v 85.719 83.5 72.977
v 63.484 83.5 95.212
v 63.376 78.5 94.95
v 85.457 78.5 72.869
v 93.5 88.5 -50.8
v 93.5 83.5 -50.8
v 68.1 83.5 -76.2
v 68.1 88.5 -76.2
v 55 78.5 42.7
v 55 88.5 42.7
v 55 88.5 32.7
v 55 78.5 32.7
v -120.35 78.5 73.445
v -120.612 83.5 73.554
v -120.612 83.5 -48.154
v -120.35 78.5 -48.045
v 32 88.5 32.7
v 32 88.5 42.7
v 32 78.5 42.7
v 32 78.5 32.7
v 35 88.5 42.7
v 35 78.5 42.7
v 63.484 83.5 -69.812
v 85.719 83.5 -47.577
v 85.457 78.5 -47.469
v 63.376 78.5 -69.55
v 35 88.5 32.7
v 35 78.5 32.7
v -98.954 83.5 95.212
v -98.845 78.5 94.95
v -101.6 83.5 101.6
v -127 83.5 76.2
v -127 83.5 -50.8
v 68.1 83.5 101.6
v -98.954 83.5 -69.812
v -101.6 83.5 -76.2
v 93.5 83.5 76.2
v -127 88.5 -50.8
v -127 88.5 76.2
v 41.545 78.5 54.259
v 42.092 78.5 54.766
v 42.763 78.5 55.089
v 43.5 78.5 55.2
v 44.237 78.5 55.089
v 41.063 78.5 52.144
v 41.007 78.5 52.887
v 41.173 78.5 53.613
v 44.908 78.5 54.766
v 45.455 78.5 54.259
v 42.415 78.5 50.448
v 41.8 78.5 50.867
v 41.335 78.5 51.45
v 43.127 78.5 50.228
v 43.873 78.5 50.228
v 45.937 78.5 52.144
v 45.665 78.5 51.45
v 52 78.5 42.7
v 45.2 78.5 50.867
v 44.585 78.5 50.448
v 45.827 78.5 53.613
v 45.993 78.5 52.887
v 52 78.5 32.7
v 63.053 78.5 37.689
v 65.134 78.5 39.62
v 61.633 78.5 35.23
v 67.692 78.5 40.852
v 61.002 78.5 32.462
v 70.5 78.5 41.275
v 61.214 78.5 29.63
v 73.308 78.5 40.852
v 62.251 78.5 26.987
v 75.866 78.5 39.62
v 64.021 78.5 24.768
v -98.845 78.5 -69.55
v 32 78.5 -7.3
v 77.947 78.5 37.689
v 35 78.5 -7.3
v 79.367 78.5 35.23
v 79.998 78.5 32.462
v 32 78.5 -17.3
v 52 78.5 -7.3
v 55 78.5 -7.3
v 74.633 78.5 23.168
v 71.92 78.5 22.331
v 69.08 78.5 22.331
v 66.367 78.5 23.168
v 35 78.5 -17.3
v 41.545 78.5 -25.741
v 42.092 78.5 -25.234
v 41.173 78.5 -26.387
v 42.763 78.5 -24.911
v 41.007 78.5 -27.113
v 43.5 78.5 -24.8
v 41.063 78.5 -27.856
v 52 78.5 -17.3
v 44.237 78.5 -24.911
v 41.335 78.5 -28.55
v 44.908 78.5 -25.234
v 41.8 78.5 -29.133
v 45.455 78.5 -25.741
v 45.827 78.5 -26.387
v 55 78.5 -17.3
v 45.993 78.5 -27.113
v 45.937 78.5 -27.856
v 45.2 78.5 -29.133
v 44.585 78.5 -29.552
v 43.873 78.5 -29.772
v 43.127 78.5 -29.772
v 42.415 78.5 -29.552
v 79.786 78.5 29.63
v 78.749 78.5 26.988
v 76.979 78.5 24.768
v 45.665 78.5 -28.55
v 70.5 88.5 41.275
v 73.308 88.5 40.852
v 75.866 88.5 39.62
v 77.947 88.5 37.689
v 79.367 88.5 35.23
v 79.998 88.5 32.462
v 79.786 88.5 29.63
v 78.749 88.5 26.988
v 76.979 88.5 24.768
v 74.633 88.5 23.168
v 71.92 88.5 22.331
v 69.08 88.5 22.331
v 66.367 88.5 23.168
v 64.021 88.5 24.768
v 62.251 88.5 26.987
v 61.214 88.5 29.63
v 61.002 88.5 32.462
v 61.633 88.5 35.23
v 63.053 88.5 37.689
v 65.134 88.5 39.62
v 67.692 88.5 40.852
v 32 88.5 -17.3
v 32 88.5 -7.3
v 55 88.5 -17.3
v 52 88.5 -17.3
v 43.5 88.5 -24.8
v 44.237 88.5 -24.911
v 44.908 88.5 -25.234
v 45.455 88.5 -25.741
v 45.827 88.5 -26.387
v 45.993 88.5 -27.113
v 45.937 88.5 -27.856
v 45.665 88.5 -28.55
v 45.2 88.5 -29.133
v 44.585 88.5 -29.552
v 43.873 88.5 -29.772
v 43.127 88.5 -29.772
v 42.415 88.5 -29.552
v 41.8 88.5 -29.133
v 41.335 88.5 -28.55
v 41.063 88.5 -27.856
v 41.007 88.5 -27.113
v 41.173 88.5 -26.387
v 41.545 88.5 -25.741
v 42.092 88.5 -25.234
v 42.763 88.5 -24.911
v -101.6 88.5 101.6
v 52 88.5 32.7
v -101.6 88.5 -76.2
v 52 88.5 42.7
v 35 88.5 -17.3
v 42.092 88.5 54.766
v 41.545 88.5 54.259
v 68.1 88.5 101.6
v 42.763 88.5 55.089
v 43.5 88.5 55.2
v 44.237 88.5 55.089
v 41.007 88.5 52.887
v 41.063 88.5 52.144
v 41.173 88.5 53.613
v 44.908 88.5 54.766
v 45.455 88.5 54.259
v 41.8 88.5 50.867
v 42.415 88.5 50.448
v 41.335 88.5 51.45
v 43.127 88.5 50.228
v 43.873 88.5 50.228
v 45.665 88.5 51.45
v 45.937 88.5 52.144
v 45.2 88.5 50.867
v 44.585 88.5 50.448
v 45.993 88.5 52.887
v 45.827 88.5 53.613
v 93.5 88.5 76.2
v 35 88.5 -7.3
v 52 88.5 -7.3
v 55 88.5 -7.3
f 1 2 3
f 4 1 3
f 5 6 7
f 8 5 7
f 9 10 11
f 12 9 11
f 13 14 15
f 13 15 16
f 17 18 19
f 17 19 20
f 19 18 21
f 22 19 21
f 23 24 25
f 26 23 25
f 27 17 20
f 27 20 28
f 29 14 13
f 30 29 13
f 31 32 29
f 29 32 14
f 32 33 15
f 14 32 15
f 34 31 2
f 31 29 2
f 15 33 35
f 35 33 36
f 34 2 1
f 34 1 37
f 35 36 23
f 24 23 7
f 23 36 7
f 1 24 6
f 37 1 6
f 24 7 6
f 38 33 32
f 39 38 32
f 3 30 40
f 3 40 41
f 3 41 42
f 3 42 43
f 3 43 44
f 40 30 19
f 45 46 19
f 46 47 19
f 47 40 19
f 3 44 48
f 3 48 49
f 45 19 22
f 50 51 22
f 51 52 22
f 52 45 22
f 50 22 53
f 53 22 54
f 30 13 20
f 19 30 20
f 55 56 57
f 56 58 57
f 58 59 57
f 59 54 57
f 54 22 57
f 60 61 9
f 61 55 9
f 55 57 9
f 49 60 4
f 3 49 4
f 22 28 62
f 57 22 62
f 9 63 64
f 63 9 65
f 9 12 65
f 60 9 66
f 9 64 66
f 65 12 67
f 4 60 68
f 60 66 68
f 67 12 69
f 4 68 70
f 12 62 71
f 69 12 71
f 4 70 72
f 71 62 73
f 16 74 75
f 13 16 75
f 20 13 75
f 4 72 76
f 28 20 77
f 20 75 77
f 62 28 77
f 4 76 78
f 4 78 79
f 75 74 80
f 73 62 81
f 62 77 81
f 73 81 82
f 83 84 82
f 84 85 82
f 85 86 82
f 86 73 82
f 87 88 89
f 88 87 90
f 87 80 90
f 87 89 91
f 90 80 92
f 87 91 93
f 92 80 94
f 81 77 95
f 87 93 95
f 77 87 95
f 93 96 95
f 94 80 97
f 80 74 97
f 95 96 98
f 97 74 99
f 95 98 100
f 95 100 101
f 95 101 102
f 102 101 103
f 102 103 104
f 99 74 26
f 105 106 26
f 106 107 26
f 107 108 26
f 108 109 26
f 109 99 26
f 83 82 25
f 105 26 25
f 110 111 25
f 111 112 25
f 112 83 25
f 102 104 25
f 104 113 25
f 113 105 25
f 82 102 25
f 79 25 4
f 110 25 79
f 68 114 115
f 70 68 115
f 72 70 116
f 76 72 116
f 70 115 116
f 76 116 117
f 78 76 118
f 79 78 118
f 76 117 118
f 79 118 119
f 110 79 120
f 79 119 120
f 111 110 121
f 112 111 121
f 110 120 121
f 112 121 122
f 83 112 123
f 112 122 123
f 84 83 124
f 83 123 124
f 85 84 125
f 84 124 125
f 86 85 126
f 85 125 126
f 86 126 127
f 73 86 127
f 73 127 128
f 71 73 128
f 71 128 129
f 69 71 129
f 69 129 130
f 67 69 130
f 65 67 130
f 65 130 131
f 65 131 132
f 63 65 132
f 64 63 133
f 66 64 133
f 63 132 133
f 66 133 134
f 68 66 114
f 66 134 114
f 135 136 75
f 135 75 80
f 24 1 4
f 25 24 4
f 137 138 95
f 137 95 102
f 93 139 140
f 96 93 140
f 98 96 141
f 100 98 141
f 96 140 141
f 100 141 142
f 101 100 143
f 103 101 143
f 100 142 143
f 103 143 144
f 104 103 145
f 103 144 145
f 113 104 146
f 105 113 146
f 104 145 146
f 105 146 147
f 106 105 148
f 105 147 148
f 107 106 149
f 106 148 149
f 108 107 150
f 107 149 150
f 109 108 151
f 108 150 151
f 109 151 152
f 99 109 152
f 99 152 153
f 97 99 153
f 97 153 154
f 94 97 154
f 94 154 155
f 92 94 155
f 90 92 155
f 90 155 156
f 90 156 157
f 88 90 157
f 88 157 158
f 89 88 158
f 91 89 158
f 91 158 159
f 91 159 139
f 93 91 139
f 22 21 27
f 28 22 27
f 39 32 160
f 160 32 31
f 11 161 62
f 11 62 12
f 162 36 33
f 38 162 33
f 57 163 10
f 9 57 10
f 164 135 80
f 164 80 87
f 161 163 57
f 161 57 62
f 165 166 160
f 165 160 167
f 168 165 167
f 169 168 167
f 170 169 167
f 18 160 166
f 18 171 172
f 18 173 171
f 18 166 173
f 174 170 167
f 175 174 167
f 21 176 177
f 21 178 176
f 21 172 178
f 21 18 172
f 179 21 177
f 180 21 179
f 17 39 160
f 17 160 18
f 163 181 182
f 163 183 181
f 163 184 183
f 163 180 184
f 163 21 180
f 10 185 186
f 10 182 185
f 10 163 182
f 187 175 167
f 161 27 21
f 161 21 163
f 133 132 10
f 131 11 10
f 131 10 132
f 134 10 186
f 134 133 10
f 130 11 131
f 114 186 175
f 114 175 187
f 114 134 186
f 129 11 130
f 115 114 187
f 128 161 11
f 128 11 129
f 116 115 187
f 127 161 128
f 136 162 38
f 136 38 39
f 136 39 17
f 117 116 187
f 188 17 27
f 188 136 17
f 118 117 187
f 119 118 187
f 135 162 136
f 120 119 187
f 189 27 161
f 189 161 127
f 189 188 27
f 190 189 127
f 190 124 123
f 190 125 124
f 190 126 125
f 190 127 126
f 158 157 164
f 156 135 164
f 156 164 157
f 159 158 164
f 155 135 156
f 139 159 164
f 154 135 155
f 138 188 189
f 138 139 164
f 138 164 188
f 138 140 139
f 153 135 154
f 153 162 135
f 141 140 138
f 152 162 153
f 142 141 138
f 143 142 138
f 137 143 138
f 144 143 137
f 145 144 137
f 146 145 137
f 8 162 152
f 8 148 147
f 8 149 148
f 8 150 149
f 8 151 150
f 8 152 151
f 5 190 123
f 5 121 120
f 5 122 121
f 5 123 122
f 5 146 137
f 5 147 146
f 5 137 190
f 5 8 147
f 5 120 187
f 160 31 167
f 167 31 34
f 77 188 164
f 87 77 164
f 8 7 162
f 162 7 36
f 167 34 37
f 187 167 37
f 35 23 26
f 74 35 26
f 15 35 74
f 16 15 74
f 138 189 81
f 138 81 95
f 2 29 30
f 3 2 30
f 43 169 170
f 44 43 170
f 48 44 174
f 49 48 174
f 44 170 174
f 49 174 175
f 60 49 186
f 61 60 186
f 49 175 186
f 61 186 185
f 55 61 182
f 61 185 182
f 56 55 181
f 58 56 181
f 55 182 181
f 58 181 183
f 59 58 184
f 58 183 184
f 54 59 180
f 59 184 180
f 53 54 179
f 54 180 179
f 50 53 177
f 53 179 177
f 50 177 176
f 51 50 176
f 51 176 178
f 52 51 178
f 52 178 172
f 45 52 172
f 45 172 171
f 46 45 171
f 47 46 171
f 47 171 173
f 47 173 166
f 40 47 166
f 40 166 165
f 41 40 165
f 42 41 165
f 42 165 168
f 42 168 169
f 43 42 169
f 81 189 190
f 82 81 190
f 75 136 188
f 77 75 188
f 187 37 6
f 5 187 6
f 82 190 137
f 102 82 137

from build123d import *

# Parameters (mm, degrees)
SKETCH2_W               = 190.5
SKETCH2_H               = 177.8
BOSS_EXTRUDE1_DEPTH     = 5.08
CHAMFER1_SIZE           = 25.4
BOSS_EXTRUDE3_DEPTH     = 68.42
SKETCH5_R               = 9
SKETCH5_R_2             = 1.5
CUT_EXTRUDE1_DEPTH      = 231.530019737
SKETCH10_W              = 177.8
SKETCH10_H              = 73.5
BOSS_EXTRUDE6_DEPTH     = 30
CHAMFER3_SIZE           = 25.4
CUT_EXTRUDE2_DEPTH      = 68.42
BOSS_EXTRUDE7_START     = 38.1
BOSS_EXTRUDE7_DEPTH     = 10
SKETCH13_W              = 15.24
SKETCH13_H              = 10
BOSS_EXTRUDE8_DEPTH     = 7
SKETCH14_R              = 2.5
CUT_EXTRUDE3_DEPTH      = 10
MIRROR4_COPY_1_SKETCH_W = 15.24
MIRROR4_COPY_1_SKETCH_H = 10
MIRROR4_COPY_1_DEPTH    = 7
MIRROR4_COPY_2_SKETCH_R = 2.5
MIRROR4_COPY_2_DEPTH    = 10
BOSS_EXTRUDE9_START     = 5
BOSS_EXTRUDE9_DEPTH     = 5
BOSS_EXTRUDE10_START    = 10
BOSS_EXTRUDE10_DEPTH    = 5
SKETCH16_R              = 2.5
CUT_EXTRUDE4_DEPTH      = 163.946494286
SKETCH17_W              = 3
SKETCH17_H              = 10
CUT_EXTRUDE5_DEPTH      = 163.946494286
BOSS_EXTRUDE11_START    = 10
SKETCH18_W              = 3
SKETCH18_H              = 10
BOSS_EXTRUDE11_DEPTH    = 10
BOSS_EXTRUDE11_2_DEPTH  = 10
BOSS_EXTRUDE11_3_DEPTH  = 10
BOSS_EXTRUDE11_4_DEPTH  = 10
SKETCH19_W              = 23
SKETCH19_H              = 60
BOSS_EXTRUDE12_DEPTH    = 20
CHAMFER5_SIZE           = 5.724341006
CHAMFER5_SIZE_2         = 0.3
BOSS_EXTRUDE13_START    = -20
SKETCH20_R              = 2.5
BOSS_EXTRUDE13_DEPTH    = 4
SKETCH21_R              = 9.525
CUT_EXTRUDE6_DEPTH      = 10


with BuildPart() as part:
    # Sketch2 → Boss-Extrude1 (new body)
    with BuildSketch(Plane(origin=(0, 0, 0), x_dir=(1, 0, 0), z_dir=(0, 1, 0))):
        with Locations((-31.75, -12.7)):
            Rectangle(SKETCH2_W, SKETCH2_H)
    extrude(amount=BOSS_EXTRUDE1_DEPTH)

    # Chamfer1
    chamfer1_edges = [part.edges().sort_by_distance(p)[0] for p in [
        (-127, 2.54, -76.2),
        (-127, 2.54, 101.6),
    ]]
    chamfer(chamfer1_edges, length=CHAMFER1_SIZE)

    # Sketch4 → Boss-Extrude3 (add)
    with BuildSketch(Plane(origin=(0, 5.08, 0), x_dir=(1, 0, 0), z_dir=(0, 1, 0))):
        Polygon((57.15, 69.85), (-98.969743879, 69.85), (-120.65, 48.169743879), (-120.65, -73.569743879), (-98.969743879, -95.25), (57.15, -95.25), (63.5, -95.25), (63.5, -101.6), (-101.6, -101.6), (-127, -76.2), (-127, 50.8), (-101.6, 76.2), (63.5, 76.2), (63.5, 69.85), align=None)
    extrude(amount=BOSS_EXTRUDE3_DEPTH)

    # Sketch5 → Cut-Extrude1 (cut, through all)
    with BuildSketch(Plane.XY.offset(101.6)):
        with Locations((-50.8, 31.75)):
            Circle(SKETCH5_R)
        with Locations((-50.8, 47.25)):
            Circle(SKETCH5_R_2)
        with Locations((-37.376606241, 39.5)):
            Circle(SKETCH5_R_2)
        with Locations((-37.376606241, 24)):
            Circle(SKETCH5_R_2)
        with Locations((-50.8, 16.25)):
            Circle(SKETCH5_R_2)
        with Locations((-64.223393759, 24)):
            Circle(SKETCH5_R_2)
        with Locations((-64.223393759, 39.5)):
            Circle(SKETCH5_R_2)
    extrude(amount=-CUT_EXTRUDE1_DEPTH, mode=Mode.SUBTRACT)

    # Sketch10 → Boss-Extrude6 (add)
    with BuildSketch(Plane(origin=(63.5, 0, 0), x_dir=(0, 0, -1), z_dir=(1, 0, 0))):
        with Locations((-12.7, 36.75)):
            Rectangle(SKETCH10_W, SKETCH10_H)
    extrude(amount=BOSS_EXTRUDE6_DEPTH)

    # Chamfer3
    chamfer3_edges = [part.edges().sort_by_distance(p)[0] for p in [
        (93.5, 36.75, 101.6),
        (93.5, 36.75, -76.2),
    ]]
    chamfer(chamfer3_edges, length=CHAMFER3_SIZE)

    # Sketch11 → Cut-Extrude2 (cut)
    with BuildSketch(Plane(origin=(0, 73.5, 0), x_dir=(1, 0, 0), z_dir=(0, 1, 0))):
        Polygon((85.757180746, -72.992819254), (85.757180746, 47.592819254), (63.5, 69.85), (63.5, -95.25), align=None)
    extrude(amount=-CUT_EXTRUDE2_DEPTH, mode=Mode.SUBTRACT)

    # Sketch12 → Boss-Extrude7 (add)
    with BuildSketch(Plane(origin=(0, 0, 95.25), x_dir=(-1, 0, 0), z_dir=(0, 0, -1)).offset(BOSS_EXTRUDE7_START)):
        with BuildLine():
            Line((25.8, 5.08), (75.8, 5.08))
            Line((75.8, 5.08), (75.8, 31.75))
            Line((75.8, 31.75), (69.8, 31.75))
            ThreePointArc((69.8, 31.75), (50.8, 12.75), (31.8, 31.75))
            Line((31.8, 31.75), (25.8, 31.75))
            Line((25.8, 31.75), (25.8, 5.08))
        make_face()
    boss_extrude7 = extrude(amount=BOSS_EXTRUDE7_DEPTH)

    # Sketch13 → Boss-Extrude8 (add)
    with BuildSketch(Plane(origin=(0, 31.75, 0), x_dir=(1, 0, 0), z_dir=(0, 1, 0))):
        with Locations((-24.18, -52.15)):
            Rectangle(SKETCH13_W, SKETCH13_H)
    boss_extrude8 = extrude(amount=-BOSS_EXTRUDE8_DEPTH)

    # Sketch14 → Cut-Extrude3 (cut)
    with BuildSketch(Plane(origin=(0, 31.75, 0), x_dir=(1, 0, 0), z_dir=(0, 1, 0))):
        with Locations(Location((-20.37, -52.15, 0), (0, 0, 270))):
            Circle(SKETCH14_R)
    cut_extrude3 = extrude(amount=-CUT_EXTRUDE3_DEPTH, mode=Mode.SUBTRACT)

    # Mirror2: Boss-Extrude8 across plane
    add(boss_extrude8.mirror(Plane.ZY.offset(50.8)))

    # Mirror3: Cut-Extrude3 across plane
    add(cut_extrude3.mirror(Plane.ZY.offset(50.8)), mode=Mode.SUBTRACT)

    # Mirror4: Boss-Extrude7, Boss-Extrude8, Cut-Extrude3 across plane
    add(boss_extrude7.mirror(Plane.XY.offset(12.7)))
    add(boss_extrude8.mirror(Plane.XY.offset(12.7)))
    add(cut_extrude3.mirror(Plane.XY.offset(12.7)), mode=Mode.SUBTRACT)

    # Mirror4 copy 1 sketch → Mirror4 copy 1 (add)
    with BuildSketch(Plane(origin=(-101.6, 31.75, 25.4), x_dir=(-1, 0, 0), z_dir=(0, 1, 0))):
        with Locations((-24.18, -52.15)):
            Rectangle(MIRROR4_COPY_1_SKETCH_W, MIRROR4_COPY_1_SKETCH_H)
    extrude(amount=-MIRROR4_COPY_1_DEPTH)

    # Mirror4 copy 2 sketch → Mirror4 copy 2 (cut)
    with BuildSketch(Plane(origin=(-101.6, 31.75, 25.4), x_dir=(-1, 0, 0), z_dir=(0, 1, 0))):
        with Locations(Location((-20.37, -52.15, 0), (0, 0, 270))):
            Circle(MIRROR4_COPY_2_SKETCH_R)
    extrude(amount=-MIRROR4_COPY_2_DEPTH, mode=Mode.SUBTRACT)


with BuildPart() as body_2:
    # Sketch15 → Boss-Extrude9 (new body)
    with BuildSketch(Plane(origin=(0, 73.5, 0), x_dir=(1, 0, 0), z_dir=(0, 1, 0)).offset(BOSS_EXTRUDE9_START)):
        Polygon((85.757180746, 47.592819254), (63.5, 69.85), (-98.969743879, 69.85), (-120.65, 48.169743879), (-120.65, -73.569743879), (-98.969743879, -95.25), (63.5, -95.25), (85.757180746, -72.992819254), align=None)
    extrude(amount=BOSS_EXTRUDE9_DEPTH)

    # Sketch15<3> → Boss-Extrude10 (add)
    with BuildSketch(Plane(origin=(0, 73.5, 0), x_dir=(1, 0, 0), z_dir=(0, 1, 0)).offset(BOSS_EXTRUDE10_START)):
        Polygon((68.1, -101.6), (93.5, -76.2), (93.5, 50.8), (68.1, 76.2), (-101.6, 76.2), (-127, 50.8), (-127, -76.2), (-101.6, -101.6), align=None)
    extrude(amount=BOSS_EXTRUDE10_DEPTH)

    # Sketch16 → Cut-Extrude4 (cut, through all)
    with BuildSketch(Plane(origin=(0, 88.5, 0), x_dir=(1, 0, 0), z_dir=(0, 1, 0))):
        with Locations(Location((43.5, 27.3, 0), (0, 0, 270))):
            Circle(SKETCH16_R)
        with Locations(Location((43.5, -52.7, 0), (0, 0, 270))):
            Circle(SKETCH16_R)
    extrude(amount=-CUT_EXTRUDE4_DEPTH, mode=Mode.SUBTRACT)

    # Sketch17 → Cut-Extrude5 (cut, through all)
    with BuildSketch(Plane(origin=(0, 88.5, 0), x_dir=(1, 0, 0), z_dir=(0, 1, 0))):
        with Locations((33.5, 12.3)):
            Rectangle(SKETCH17_W, SKETCH17_H)
        with Locations((53.5, 12.3)):
            Rectangle(SKETCH17_W, SKETCH17_H)
        with Locations((33.5, -37.7)):
            Rectangle(SKETCH17_W, SKETCH17_H)
        with Locations((53.5, -37.7)):
            Rectangle(SKETCH17_W, SKETCH17_H)
    extrude(amount=-CUT_EXTRUDE5_DEPTH, mode=Mode.SUBTRACT)

    # Chamfer5
    # the kernel refuses this chamfer: 5.724341006, 0.3 mm, written as the material it takes off along each edge
    with BuildSketch(Plane(origin=(52.976460511, 78.5, 105.773539489), x_dir=(0.0014234225126538123, 0.999997973866298, 0.0014234225126538165), z_dir=(0.7071067811865485, 0, -0.7071067811865466))) as chamfer5_piece_1_section:
        Polygon((CHAMFER5_SIZE * 0.999997973922, -CHAMFER5_SIZE * 0.00201302342249), (-CHAMFER5_SIZE_2 * 0.00201302342238, -CHAMFER5_SIZE_2 * 0.999997973866), (0, 0), align=None)
    chamfer5_piece_1 = extrude(amount=61.24147141, mode=Mode.PRIVATE)
    chamfer5_piece_1 = split(chamfer5_piece_1, bisect_by=Plane(origin=(74.599777389, 83.5, 84.092596643), z_dir=(0, -1, 0)), keep=Keep.TOP, mode=Mode.PRIVATE)
    add(chamfer5_piece_1, mode=Mode.SUBTRACT)
    with BuildSketch(Plane(origin=(-113.852276148, 78.5, 95.25), x_dir=(0, 0.999997973866298, 0.002013023422382438), z_dir=(1, 0, 0))) as chamfer5_piece_2_section:
        Polygon((CHAMFER5_SIZE * 0.999997973922, -CHAMFER5_SIZE * 0.00201302342249), (-CHAMFER5_SIZE_2 * 0.00201302342238, -CHAMFER5_SIZE_2 * 0.999997973866), (0, 0), align=None)
    chamfer5_piece_2 = extrude(amount=192.234808418, mode=Mode.PRIVATE)
    chamfer5_piece_2 = split(chamfer5_piece_2, bisect_by=Plane(origin=(-17.734871939, 83.5, 95.209252287), z_dir=(0, -1, 0)), keep=Keep.TOP, mode=Mode.PRIVATE)
    add(chamfer5_piece_2, mode=Mode.SUBTRACT)
    with BuildSketch(Plane(origin=(-131.173539489, 78.5, 63.04620439), x_dir=(-0.0014234225126544158, 0.999997973866298, 0.0014234225126544065), z_dir=(0.7071067811865452, 0, 0.7071067811865498))) as chamfer5_piece_3_section:
        Polygon((CHAMFER5_SIZE * 0.999997973922, -CHAMFER5_SIZE * 0.00201302342249), (-CHAMFER5_SIZE_2 * 0.00201302342238, -CHAMFER5_SIZE_2 * 0.999997973866), (0, 0), align=None)
    chamfer5_piece_3 = extrude(amount=60.425576781, mode=Mode.PRIVATE)
    chamfer5_piece_3 = split(chamfer5_piece_3, bisect_by=Plane(origin=(-109.781058955, 83.5, 84.381058955), z_dir=(0, -1, 0)), keep=Keep.TOP, mode=Mode.PRIVATE)
    add(chamfer5_piece_3, mode=Mode.SUBTRACT)
    with BuildSketch(Plane(origin=(-120.65, 78.5, -63.052276148), x_dir=(-0.002013023422382438, 0.999997973866298, 0), z_dir=(0, 0, 1))) as chamfer5_piece_4_section:
        Polygon((CHAMFER5_SIZE * 0.999997973922, -CHAMFER5_SIZE * 0.00201302342249), (-CHAMFER5_SIZE_2 * 0.00201302342238, -CHAMFER5_SIZE_2 * 0.999997973866), (0, 0), align=None)
    chamfer5_piece_4 = extrude(amount=151.504552297, mode=Mode.PRIVATE)
    chamfer5_piece_4 = split(chamfer5_piece_4, bisect_by=Plane(origin=(-120.609252287, 83.5, 12.7), z_dir=(0, -1, 0)), keep=Keep.TOP, mode=Mode.PRIVATE)
    add(chamfer5_piece_4, mode=Mode.SUBTRACT)
    with BuildSketch(Plane(origin=(-88.44620439, 78.5, -80.373539489), x_dir=(-0.001423422512653215, 0.999997973866298, -0.0014234225126532204), z_dir=(-0.7071067811865488, 0, 0.7071067811865462))) as chamfer5_piece_5_section:
        Polygon((CHAMFER5_SIZE * 0.999997973922, -CHAMFER5_SIZE * 0.0020130234225), (-CHAMFER5_SIZE_2 * 0.00201302342238, -CHAMFER5_SIZE_2 * 0.999997973866), (0, 0), align=None)
    chamfer5_piece_5 = extrude(amount=60.425576781, mode=Mode.PRIVATE)
    chamfer5_piece_5 = split(chamfer5_piece_5, bisect_by=Plane(origin=(-109.781058955, 83.5, -58.981058955), z_dir=(0, -1, 0)), keep=Keep.TOP, mode=Mode.PRIVATE)
    add(chamfer5_piece_5, mode=Mode.SUBTRACT)
    with BuildSketch(Plane(origin=(78.382532269, 78.5, -69.85), x_dir=(0, 0.999997973866298, -0.002013023422382438), z_dir=(-1, 0, 0))) as chamfer5_piece_6_section:
        Polygon((CHAMFER5_SIZE * 0.999997973922, -CHAMFER5_SIZE * 0.00201302342249), (-CHAMFER5_SIZE_2 * 0.00201302342238, -CHAMFER5_SIZE_2 * 0.999997973866), (0, 0), align=None)
    chamfer5_piece_6 = extrude(amount=192.234808418, mode=Mode.PRIVATE)
    chamfer5_piece_6 = split(chamfer5_piece_6, bisect_by=Plane(origin=(-17.734871939, 83.5, -69.809252287), z_dir=(0, -1, 0)), keep=Keep.TOP, mode=Mode.PRIVATE)
    add(chamfer5_piece_6, mode=Mode.SUBTRACT)
    with BuildSketch(Plane(origin=(96.280720235, 78.5, -37.069279765), x_dir=(0.0014234225126538128, 0.999997973866298, -0.0014234225126538162), z_dir=(-0.7071067811865483, 0, -0.7071067811865467))) as chamfer5_piece_7_section:
        Polygon((CHAMFER5_SIZE * 0.999997973922, -CHAMFER5_SIZE * 0.00201302342249), (-CHAMFER5_SIZE_2 * 0.00201302342238, -CHAMFER5_SIZE_2 * 0.999997973866), (0, 0), align=None)
    chamfer5_piece_7 = extrude(amount=61.24147141, mode=Mode.PRIVATE)
    chamfer5_piece_7 = split(chamfer5_piece_7, bisect_by=Plane(origin=(74.599777389, 83.5, -58.692596643), z_dir=(0, -1, 0)), keep=Keep.TOP, mode=Mode.PRIVATE)
    add(chamfer5_piece_7, mode=Mode.SUBTRACT)
    with BuildSketch(Plane(origin=(85.757180746, 78.5, 87.875351523), x_dir=(0.002013023422382438, 0.999997973866298, 0), z_dir=(0, 0, -1))) as chamfer5_piece_8_section:
        Polygon((CHAMFER5_SIZE * 0.999997973922, -CHAMFER5_SIZE * 0.00201302342249), (-CHAMFER5_SIZE_2 * 0.00201302342238, -CHAMFER5_SIZE_2 * 0.999997973866), (0, 0), align=None)
    chamfer5_piece_8 = extrude(amount=150.350703047, mode=Mode.PRIVATE)
    chamfer5_piece_8 = split(chamfer5_piece_8, bisect_by=Plane(origin=(85.716433033, 83.5, 12.7), z_dir=(0, -1, 0)), keep=Keep.TOP, mode=Mode.PRIVATE)
    add(chamfer5_piece_8, mode=Mode.SUBTRACT)

    # Sketch21 → Cut-Extrude6 (cut)
    with BuildSketch(Plane(origin=(0, 88.5, 0), x_dir=(1, 0, 0), z_dir=(0, 1, 0))):
        with Locations(Location((70.5, -31.75, 0), (0, 0, 270))):
            Circle(SKETCH21_R)
    extrude(amount=-CUT_EXTRUDE6_DEPTH, mode=Mode.SUBTRACT)


with BuildPart() as body_2_2:
    # Sketch18 → Boss-Extrude11 (new body)
    with BuildSketch(Plane(origin=(0, 88.5, 0), x_dir=(1, 0, 0), z_dir=(0, 1, 0)).offset(BOSS_EXTRUDE11_START)):
        with Locations((53.5, -37.7)):
            Rectangle(SKETCH18_W, SKETCH18_H)
    extrude(amount=BOSS_EXTRUDE11_DEPTH)



with BuildPart() as body_3:
    # Sketch18 → Boss-Extrude11 2 (new body)
    with BuildSketch(Plane(origin=(0, 88.5, 0), x_dir=(1, 0, 0), z_dir=(0, 1, 0)).offset(BOSS_EXTRUDE11_START)):
        with Locations((33.5, -37.7)):
            Rectangle(SKETCH18_W, SKETCH18_H)
    extrude(amount=BOSS_EXTRUDE11_2_DEPTH)


with BuildPart() as body_4:
    # Sketch18 → Boss-Extrude11 3 (new body)
    with BuildSketch(Plane(origin=(0, 88.5, 0), x_dir=(1, 0, 0), z_dir=(0, 1, 0)).offset(BOSS_EXTRUDE11_START)):
        with Locations((33.5, 12.3)):
            Rectangle(SKETCH18_W, SKETCH18_H)
    extrude(amount=BOSS_EXTRUDE11_3_DEPTH)


with BuildPart() as body_5:
    # Sketch18 → Boss-Extrude11 4 (new body)
    with BuildSketch(Plane(origin=(0, 88.5, 0), x_dir=(1, 0, 0), z_dir=(0, 1, 0)).offset(BOSS_EXTRUDE11_START)):
        with Locations((53.5, 12.3)):
            Rectangle(SKETCH18_W, SKETCH18_H)
    extrude(amount=BOSS_EXTRUDE11_4_DEPTH)


with BuildPart() as body_2_2_1:
    add(body_2_2.part)

    add(body_3.part)  # Boss-Extrude12 merges body 3

    add(body_4.part)  # Boss-Extrude12 merges body 4

    add(body_5.part)  # Boss-Extrude12 merges body 5
    # Sketch19 → Boss-Extrude12 (add)
    with BuildSketch(Plane(origin=(0, 108.5, 0), x_dir=(1, 0, 0), z_dir=(0, 1, 0))):
        with Locations((43.5, -12.7)):
            Rectangle(SKETCH19_W, SKETCH19_H)
    extrude(amount=BOSS_EXTRUDE12_DEPTH)

    # Sketch20 → Boss-Extrude13 (add)
    # profile 1 of 2: a face of its own
    with BuildSketch(Plane(origin=(0, 128.5, 0), x_dir=(1, 0, 0), z_dir=(0, 1, 0)).offset(BOSS_EXTRUDE13_START)):
        with BuildLine():
            Line((32, 17.3), (39.162824532, 29.787751788))
            ThreePointArc((39.162824532, 29.787751788), (43.5, 32.3), (47.837175468, 29.787751788))
            Line((47.837175468, 29.787751788), (55, 17.3))
            Line((55, 17.3), (32, 17.3))
        make_face()
        with Locations(Location((43.5, 27.3, 0), (0, 0, 270))):
            Circle(SKETCH20_R, mode=Mode.SUBTRACT)
    # profile 2 of 2: a face of its own
    with BuildSketch(Plane(origin=(0, 128.5, 0), x_dir=(1, 0, 0), z_dir=(0, 1, 0)).offset(BOSS_EXTRUDE13_START)):
        with BuildLine():
            Line((55, -42.7), (47.837175468, -55.187751788))
            ThreePointArc((47.837175468, -55.187751788), (43.5, -57.7), (39.162824532, -55.187751788))
            Line((39.162824532, -55.187751788), (32, -42.7))
            Line((32, -42.7), (55, -42.7))
        make_face()
        with Locations(Location((43.5, -52.7, 0), (0, 0, 270))):
            Circle(SKETCH20_R, mode=Mode.SUBTRACT)
    extrude(amount=BOSS_EXTRUDE13_DEPTH)


solid = body_2.part
